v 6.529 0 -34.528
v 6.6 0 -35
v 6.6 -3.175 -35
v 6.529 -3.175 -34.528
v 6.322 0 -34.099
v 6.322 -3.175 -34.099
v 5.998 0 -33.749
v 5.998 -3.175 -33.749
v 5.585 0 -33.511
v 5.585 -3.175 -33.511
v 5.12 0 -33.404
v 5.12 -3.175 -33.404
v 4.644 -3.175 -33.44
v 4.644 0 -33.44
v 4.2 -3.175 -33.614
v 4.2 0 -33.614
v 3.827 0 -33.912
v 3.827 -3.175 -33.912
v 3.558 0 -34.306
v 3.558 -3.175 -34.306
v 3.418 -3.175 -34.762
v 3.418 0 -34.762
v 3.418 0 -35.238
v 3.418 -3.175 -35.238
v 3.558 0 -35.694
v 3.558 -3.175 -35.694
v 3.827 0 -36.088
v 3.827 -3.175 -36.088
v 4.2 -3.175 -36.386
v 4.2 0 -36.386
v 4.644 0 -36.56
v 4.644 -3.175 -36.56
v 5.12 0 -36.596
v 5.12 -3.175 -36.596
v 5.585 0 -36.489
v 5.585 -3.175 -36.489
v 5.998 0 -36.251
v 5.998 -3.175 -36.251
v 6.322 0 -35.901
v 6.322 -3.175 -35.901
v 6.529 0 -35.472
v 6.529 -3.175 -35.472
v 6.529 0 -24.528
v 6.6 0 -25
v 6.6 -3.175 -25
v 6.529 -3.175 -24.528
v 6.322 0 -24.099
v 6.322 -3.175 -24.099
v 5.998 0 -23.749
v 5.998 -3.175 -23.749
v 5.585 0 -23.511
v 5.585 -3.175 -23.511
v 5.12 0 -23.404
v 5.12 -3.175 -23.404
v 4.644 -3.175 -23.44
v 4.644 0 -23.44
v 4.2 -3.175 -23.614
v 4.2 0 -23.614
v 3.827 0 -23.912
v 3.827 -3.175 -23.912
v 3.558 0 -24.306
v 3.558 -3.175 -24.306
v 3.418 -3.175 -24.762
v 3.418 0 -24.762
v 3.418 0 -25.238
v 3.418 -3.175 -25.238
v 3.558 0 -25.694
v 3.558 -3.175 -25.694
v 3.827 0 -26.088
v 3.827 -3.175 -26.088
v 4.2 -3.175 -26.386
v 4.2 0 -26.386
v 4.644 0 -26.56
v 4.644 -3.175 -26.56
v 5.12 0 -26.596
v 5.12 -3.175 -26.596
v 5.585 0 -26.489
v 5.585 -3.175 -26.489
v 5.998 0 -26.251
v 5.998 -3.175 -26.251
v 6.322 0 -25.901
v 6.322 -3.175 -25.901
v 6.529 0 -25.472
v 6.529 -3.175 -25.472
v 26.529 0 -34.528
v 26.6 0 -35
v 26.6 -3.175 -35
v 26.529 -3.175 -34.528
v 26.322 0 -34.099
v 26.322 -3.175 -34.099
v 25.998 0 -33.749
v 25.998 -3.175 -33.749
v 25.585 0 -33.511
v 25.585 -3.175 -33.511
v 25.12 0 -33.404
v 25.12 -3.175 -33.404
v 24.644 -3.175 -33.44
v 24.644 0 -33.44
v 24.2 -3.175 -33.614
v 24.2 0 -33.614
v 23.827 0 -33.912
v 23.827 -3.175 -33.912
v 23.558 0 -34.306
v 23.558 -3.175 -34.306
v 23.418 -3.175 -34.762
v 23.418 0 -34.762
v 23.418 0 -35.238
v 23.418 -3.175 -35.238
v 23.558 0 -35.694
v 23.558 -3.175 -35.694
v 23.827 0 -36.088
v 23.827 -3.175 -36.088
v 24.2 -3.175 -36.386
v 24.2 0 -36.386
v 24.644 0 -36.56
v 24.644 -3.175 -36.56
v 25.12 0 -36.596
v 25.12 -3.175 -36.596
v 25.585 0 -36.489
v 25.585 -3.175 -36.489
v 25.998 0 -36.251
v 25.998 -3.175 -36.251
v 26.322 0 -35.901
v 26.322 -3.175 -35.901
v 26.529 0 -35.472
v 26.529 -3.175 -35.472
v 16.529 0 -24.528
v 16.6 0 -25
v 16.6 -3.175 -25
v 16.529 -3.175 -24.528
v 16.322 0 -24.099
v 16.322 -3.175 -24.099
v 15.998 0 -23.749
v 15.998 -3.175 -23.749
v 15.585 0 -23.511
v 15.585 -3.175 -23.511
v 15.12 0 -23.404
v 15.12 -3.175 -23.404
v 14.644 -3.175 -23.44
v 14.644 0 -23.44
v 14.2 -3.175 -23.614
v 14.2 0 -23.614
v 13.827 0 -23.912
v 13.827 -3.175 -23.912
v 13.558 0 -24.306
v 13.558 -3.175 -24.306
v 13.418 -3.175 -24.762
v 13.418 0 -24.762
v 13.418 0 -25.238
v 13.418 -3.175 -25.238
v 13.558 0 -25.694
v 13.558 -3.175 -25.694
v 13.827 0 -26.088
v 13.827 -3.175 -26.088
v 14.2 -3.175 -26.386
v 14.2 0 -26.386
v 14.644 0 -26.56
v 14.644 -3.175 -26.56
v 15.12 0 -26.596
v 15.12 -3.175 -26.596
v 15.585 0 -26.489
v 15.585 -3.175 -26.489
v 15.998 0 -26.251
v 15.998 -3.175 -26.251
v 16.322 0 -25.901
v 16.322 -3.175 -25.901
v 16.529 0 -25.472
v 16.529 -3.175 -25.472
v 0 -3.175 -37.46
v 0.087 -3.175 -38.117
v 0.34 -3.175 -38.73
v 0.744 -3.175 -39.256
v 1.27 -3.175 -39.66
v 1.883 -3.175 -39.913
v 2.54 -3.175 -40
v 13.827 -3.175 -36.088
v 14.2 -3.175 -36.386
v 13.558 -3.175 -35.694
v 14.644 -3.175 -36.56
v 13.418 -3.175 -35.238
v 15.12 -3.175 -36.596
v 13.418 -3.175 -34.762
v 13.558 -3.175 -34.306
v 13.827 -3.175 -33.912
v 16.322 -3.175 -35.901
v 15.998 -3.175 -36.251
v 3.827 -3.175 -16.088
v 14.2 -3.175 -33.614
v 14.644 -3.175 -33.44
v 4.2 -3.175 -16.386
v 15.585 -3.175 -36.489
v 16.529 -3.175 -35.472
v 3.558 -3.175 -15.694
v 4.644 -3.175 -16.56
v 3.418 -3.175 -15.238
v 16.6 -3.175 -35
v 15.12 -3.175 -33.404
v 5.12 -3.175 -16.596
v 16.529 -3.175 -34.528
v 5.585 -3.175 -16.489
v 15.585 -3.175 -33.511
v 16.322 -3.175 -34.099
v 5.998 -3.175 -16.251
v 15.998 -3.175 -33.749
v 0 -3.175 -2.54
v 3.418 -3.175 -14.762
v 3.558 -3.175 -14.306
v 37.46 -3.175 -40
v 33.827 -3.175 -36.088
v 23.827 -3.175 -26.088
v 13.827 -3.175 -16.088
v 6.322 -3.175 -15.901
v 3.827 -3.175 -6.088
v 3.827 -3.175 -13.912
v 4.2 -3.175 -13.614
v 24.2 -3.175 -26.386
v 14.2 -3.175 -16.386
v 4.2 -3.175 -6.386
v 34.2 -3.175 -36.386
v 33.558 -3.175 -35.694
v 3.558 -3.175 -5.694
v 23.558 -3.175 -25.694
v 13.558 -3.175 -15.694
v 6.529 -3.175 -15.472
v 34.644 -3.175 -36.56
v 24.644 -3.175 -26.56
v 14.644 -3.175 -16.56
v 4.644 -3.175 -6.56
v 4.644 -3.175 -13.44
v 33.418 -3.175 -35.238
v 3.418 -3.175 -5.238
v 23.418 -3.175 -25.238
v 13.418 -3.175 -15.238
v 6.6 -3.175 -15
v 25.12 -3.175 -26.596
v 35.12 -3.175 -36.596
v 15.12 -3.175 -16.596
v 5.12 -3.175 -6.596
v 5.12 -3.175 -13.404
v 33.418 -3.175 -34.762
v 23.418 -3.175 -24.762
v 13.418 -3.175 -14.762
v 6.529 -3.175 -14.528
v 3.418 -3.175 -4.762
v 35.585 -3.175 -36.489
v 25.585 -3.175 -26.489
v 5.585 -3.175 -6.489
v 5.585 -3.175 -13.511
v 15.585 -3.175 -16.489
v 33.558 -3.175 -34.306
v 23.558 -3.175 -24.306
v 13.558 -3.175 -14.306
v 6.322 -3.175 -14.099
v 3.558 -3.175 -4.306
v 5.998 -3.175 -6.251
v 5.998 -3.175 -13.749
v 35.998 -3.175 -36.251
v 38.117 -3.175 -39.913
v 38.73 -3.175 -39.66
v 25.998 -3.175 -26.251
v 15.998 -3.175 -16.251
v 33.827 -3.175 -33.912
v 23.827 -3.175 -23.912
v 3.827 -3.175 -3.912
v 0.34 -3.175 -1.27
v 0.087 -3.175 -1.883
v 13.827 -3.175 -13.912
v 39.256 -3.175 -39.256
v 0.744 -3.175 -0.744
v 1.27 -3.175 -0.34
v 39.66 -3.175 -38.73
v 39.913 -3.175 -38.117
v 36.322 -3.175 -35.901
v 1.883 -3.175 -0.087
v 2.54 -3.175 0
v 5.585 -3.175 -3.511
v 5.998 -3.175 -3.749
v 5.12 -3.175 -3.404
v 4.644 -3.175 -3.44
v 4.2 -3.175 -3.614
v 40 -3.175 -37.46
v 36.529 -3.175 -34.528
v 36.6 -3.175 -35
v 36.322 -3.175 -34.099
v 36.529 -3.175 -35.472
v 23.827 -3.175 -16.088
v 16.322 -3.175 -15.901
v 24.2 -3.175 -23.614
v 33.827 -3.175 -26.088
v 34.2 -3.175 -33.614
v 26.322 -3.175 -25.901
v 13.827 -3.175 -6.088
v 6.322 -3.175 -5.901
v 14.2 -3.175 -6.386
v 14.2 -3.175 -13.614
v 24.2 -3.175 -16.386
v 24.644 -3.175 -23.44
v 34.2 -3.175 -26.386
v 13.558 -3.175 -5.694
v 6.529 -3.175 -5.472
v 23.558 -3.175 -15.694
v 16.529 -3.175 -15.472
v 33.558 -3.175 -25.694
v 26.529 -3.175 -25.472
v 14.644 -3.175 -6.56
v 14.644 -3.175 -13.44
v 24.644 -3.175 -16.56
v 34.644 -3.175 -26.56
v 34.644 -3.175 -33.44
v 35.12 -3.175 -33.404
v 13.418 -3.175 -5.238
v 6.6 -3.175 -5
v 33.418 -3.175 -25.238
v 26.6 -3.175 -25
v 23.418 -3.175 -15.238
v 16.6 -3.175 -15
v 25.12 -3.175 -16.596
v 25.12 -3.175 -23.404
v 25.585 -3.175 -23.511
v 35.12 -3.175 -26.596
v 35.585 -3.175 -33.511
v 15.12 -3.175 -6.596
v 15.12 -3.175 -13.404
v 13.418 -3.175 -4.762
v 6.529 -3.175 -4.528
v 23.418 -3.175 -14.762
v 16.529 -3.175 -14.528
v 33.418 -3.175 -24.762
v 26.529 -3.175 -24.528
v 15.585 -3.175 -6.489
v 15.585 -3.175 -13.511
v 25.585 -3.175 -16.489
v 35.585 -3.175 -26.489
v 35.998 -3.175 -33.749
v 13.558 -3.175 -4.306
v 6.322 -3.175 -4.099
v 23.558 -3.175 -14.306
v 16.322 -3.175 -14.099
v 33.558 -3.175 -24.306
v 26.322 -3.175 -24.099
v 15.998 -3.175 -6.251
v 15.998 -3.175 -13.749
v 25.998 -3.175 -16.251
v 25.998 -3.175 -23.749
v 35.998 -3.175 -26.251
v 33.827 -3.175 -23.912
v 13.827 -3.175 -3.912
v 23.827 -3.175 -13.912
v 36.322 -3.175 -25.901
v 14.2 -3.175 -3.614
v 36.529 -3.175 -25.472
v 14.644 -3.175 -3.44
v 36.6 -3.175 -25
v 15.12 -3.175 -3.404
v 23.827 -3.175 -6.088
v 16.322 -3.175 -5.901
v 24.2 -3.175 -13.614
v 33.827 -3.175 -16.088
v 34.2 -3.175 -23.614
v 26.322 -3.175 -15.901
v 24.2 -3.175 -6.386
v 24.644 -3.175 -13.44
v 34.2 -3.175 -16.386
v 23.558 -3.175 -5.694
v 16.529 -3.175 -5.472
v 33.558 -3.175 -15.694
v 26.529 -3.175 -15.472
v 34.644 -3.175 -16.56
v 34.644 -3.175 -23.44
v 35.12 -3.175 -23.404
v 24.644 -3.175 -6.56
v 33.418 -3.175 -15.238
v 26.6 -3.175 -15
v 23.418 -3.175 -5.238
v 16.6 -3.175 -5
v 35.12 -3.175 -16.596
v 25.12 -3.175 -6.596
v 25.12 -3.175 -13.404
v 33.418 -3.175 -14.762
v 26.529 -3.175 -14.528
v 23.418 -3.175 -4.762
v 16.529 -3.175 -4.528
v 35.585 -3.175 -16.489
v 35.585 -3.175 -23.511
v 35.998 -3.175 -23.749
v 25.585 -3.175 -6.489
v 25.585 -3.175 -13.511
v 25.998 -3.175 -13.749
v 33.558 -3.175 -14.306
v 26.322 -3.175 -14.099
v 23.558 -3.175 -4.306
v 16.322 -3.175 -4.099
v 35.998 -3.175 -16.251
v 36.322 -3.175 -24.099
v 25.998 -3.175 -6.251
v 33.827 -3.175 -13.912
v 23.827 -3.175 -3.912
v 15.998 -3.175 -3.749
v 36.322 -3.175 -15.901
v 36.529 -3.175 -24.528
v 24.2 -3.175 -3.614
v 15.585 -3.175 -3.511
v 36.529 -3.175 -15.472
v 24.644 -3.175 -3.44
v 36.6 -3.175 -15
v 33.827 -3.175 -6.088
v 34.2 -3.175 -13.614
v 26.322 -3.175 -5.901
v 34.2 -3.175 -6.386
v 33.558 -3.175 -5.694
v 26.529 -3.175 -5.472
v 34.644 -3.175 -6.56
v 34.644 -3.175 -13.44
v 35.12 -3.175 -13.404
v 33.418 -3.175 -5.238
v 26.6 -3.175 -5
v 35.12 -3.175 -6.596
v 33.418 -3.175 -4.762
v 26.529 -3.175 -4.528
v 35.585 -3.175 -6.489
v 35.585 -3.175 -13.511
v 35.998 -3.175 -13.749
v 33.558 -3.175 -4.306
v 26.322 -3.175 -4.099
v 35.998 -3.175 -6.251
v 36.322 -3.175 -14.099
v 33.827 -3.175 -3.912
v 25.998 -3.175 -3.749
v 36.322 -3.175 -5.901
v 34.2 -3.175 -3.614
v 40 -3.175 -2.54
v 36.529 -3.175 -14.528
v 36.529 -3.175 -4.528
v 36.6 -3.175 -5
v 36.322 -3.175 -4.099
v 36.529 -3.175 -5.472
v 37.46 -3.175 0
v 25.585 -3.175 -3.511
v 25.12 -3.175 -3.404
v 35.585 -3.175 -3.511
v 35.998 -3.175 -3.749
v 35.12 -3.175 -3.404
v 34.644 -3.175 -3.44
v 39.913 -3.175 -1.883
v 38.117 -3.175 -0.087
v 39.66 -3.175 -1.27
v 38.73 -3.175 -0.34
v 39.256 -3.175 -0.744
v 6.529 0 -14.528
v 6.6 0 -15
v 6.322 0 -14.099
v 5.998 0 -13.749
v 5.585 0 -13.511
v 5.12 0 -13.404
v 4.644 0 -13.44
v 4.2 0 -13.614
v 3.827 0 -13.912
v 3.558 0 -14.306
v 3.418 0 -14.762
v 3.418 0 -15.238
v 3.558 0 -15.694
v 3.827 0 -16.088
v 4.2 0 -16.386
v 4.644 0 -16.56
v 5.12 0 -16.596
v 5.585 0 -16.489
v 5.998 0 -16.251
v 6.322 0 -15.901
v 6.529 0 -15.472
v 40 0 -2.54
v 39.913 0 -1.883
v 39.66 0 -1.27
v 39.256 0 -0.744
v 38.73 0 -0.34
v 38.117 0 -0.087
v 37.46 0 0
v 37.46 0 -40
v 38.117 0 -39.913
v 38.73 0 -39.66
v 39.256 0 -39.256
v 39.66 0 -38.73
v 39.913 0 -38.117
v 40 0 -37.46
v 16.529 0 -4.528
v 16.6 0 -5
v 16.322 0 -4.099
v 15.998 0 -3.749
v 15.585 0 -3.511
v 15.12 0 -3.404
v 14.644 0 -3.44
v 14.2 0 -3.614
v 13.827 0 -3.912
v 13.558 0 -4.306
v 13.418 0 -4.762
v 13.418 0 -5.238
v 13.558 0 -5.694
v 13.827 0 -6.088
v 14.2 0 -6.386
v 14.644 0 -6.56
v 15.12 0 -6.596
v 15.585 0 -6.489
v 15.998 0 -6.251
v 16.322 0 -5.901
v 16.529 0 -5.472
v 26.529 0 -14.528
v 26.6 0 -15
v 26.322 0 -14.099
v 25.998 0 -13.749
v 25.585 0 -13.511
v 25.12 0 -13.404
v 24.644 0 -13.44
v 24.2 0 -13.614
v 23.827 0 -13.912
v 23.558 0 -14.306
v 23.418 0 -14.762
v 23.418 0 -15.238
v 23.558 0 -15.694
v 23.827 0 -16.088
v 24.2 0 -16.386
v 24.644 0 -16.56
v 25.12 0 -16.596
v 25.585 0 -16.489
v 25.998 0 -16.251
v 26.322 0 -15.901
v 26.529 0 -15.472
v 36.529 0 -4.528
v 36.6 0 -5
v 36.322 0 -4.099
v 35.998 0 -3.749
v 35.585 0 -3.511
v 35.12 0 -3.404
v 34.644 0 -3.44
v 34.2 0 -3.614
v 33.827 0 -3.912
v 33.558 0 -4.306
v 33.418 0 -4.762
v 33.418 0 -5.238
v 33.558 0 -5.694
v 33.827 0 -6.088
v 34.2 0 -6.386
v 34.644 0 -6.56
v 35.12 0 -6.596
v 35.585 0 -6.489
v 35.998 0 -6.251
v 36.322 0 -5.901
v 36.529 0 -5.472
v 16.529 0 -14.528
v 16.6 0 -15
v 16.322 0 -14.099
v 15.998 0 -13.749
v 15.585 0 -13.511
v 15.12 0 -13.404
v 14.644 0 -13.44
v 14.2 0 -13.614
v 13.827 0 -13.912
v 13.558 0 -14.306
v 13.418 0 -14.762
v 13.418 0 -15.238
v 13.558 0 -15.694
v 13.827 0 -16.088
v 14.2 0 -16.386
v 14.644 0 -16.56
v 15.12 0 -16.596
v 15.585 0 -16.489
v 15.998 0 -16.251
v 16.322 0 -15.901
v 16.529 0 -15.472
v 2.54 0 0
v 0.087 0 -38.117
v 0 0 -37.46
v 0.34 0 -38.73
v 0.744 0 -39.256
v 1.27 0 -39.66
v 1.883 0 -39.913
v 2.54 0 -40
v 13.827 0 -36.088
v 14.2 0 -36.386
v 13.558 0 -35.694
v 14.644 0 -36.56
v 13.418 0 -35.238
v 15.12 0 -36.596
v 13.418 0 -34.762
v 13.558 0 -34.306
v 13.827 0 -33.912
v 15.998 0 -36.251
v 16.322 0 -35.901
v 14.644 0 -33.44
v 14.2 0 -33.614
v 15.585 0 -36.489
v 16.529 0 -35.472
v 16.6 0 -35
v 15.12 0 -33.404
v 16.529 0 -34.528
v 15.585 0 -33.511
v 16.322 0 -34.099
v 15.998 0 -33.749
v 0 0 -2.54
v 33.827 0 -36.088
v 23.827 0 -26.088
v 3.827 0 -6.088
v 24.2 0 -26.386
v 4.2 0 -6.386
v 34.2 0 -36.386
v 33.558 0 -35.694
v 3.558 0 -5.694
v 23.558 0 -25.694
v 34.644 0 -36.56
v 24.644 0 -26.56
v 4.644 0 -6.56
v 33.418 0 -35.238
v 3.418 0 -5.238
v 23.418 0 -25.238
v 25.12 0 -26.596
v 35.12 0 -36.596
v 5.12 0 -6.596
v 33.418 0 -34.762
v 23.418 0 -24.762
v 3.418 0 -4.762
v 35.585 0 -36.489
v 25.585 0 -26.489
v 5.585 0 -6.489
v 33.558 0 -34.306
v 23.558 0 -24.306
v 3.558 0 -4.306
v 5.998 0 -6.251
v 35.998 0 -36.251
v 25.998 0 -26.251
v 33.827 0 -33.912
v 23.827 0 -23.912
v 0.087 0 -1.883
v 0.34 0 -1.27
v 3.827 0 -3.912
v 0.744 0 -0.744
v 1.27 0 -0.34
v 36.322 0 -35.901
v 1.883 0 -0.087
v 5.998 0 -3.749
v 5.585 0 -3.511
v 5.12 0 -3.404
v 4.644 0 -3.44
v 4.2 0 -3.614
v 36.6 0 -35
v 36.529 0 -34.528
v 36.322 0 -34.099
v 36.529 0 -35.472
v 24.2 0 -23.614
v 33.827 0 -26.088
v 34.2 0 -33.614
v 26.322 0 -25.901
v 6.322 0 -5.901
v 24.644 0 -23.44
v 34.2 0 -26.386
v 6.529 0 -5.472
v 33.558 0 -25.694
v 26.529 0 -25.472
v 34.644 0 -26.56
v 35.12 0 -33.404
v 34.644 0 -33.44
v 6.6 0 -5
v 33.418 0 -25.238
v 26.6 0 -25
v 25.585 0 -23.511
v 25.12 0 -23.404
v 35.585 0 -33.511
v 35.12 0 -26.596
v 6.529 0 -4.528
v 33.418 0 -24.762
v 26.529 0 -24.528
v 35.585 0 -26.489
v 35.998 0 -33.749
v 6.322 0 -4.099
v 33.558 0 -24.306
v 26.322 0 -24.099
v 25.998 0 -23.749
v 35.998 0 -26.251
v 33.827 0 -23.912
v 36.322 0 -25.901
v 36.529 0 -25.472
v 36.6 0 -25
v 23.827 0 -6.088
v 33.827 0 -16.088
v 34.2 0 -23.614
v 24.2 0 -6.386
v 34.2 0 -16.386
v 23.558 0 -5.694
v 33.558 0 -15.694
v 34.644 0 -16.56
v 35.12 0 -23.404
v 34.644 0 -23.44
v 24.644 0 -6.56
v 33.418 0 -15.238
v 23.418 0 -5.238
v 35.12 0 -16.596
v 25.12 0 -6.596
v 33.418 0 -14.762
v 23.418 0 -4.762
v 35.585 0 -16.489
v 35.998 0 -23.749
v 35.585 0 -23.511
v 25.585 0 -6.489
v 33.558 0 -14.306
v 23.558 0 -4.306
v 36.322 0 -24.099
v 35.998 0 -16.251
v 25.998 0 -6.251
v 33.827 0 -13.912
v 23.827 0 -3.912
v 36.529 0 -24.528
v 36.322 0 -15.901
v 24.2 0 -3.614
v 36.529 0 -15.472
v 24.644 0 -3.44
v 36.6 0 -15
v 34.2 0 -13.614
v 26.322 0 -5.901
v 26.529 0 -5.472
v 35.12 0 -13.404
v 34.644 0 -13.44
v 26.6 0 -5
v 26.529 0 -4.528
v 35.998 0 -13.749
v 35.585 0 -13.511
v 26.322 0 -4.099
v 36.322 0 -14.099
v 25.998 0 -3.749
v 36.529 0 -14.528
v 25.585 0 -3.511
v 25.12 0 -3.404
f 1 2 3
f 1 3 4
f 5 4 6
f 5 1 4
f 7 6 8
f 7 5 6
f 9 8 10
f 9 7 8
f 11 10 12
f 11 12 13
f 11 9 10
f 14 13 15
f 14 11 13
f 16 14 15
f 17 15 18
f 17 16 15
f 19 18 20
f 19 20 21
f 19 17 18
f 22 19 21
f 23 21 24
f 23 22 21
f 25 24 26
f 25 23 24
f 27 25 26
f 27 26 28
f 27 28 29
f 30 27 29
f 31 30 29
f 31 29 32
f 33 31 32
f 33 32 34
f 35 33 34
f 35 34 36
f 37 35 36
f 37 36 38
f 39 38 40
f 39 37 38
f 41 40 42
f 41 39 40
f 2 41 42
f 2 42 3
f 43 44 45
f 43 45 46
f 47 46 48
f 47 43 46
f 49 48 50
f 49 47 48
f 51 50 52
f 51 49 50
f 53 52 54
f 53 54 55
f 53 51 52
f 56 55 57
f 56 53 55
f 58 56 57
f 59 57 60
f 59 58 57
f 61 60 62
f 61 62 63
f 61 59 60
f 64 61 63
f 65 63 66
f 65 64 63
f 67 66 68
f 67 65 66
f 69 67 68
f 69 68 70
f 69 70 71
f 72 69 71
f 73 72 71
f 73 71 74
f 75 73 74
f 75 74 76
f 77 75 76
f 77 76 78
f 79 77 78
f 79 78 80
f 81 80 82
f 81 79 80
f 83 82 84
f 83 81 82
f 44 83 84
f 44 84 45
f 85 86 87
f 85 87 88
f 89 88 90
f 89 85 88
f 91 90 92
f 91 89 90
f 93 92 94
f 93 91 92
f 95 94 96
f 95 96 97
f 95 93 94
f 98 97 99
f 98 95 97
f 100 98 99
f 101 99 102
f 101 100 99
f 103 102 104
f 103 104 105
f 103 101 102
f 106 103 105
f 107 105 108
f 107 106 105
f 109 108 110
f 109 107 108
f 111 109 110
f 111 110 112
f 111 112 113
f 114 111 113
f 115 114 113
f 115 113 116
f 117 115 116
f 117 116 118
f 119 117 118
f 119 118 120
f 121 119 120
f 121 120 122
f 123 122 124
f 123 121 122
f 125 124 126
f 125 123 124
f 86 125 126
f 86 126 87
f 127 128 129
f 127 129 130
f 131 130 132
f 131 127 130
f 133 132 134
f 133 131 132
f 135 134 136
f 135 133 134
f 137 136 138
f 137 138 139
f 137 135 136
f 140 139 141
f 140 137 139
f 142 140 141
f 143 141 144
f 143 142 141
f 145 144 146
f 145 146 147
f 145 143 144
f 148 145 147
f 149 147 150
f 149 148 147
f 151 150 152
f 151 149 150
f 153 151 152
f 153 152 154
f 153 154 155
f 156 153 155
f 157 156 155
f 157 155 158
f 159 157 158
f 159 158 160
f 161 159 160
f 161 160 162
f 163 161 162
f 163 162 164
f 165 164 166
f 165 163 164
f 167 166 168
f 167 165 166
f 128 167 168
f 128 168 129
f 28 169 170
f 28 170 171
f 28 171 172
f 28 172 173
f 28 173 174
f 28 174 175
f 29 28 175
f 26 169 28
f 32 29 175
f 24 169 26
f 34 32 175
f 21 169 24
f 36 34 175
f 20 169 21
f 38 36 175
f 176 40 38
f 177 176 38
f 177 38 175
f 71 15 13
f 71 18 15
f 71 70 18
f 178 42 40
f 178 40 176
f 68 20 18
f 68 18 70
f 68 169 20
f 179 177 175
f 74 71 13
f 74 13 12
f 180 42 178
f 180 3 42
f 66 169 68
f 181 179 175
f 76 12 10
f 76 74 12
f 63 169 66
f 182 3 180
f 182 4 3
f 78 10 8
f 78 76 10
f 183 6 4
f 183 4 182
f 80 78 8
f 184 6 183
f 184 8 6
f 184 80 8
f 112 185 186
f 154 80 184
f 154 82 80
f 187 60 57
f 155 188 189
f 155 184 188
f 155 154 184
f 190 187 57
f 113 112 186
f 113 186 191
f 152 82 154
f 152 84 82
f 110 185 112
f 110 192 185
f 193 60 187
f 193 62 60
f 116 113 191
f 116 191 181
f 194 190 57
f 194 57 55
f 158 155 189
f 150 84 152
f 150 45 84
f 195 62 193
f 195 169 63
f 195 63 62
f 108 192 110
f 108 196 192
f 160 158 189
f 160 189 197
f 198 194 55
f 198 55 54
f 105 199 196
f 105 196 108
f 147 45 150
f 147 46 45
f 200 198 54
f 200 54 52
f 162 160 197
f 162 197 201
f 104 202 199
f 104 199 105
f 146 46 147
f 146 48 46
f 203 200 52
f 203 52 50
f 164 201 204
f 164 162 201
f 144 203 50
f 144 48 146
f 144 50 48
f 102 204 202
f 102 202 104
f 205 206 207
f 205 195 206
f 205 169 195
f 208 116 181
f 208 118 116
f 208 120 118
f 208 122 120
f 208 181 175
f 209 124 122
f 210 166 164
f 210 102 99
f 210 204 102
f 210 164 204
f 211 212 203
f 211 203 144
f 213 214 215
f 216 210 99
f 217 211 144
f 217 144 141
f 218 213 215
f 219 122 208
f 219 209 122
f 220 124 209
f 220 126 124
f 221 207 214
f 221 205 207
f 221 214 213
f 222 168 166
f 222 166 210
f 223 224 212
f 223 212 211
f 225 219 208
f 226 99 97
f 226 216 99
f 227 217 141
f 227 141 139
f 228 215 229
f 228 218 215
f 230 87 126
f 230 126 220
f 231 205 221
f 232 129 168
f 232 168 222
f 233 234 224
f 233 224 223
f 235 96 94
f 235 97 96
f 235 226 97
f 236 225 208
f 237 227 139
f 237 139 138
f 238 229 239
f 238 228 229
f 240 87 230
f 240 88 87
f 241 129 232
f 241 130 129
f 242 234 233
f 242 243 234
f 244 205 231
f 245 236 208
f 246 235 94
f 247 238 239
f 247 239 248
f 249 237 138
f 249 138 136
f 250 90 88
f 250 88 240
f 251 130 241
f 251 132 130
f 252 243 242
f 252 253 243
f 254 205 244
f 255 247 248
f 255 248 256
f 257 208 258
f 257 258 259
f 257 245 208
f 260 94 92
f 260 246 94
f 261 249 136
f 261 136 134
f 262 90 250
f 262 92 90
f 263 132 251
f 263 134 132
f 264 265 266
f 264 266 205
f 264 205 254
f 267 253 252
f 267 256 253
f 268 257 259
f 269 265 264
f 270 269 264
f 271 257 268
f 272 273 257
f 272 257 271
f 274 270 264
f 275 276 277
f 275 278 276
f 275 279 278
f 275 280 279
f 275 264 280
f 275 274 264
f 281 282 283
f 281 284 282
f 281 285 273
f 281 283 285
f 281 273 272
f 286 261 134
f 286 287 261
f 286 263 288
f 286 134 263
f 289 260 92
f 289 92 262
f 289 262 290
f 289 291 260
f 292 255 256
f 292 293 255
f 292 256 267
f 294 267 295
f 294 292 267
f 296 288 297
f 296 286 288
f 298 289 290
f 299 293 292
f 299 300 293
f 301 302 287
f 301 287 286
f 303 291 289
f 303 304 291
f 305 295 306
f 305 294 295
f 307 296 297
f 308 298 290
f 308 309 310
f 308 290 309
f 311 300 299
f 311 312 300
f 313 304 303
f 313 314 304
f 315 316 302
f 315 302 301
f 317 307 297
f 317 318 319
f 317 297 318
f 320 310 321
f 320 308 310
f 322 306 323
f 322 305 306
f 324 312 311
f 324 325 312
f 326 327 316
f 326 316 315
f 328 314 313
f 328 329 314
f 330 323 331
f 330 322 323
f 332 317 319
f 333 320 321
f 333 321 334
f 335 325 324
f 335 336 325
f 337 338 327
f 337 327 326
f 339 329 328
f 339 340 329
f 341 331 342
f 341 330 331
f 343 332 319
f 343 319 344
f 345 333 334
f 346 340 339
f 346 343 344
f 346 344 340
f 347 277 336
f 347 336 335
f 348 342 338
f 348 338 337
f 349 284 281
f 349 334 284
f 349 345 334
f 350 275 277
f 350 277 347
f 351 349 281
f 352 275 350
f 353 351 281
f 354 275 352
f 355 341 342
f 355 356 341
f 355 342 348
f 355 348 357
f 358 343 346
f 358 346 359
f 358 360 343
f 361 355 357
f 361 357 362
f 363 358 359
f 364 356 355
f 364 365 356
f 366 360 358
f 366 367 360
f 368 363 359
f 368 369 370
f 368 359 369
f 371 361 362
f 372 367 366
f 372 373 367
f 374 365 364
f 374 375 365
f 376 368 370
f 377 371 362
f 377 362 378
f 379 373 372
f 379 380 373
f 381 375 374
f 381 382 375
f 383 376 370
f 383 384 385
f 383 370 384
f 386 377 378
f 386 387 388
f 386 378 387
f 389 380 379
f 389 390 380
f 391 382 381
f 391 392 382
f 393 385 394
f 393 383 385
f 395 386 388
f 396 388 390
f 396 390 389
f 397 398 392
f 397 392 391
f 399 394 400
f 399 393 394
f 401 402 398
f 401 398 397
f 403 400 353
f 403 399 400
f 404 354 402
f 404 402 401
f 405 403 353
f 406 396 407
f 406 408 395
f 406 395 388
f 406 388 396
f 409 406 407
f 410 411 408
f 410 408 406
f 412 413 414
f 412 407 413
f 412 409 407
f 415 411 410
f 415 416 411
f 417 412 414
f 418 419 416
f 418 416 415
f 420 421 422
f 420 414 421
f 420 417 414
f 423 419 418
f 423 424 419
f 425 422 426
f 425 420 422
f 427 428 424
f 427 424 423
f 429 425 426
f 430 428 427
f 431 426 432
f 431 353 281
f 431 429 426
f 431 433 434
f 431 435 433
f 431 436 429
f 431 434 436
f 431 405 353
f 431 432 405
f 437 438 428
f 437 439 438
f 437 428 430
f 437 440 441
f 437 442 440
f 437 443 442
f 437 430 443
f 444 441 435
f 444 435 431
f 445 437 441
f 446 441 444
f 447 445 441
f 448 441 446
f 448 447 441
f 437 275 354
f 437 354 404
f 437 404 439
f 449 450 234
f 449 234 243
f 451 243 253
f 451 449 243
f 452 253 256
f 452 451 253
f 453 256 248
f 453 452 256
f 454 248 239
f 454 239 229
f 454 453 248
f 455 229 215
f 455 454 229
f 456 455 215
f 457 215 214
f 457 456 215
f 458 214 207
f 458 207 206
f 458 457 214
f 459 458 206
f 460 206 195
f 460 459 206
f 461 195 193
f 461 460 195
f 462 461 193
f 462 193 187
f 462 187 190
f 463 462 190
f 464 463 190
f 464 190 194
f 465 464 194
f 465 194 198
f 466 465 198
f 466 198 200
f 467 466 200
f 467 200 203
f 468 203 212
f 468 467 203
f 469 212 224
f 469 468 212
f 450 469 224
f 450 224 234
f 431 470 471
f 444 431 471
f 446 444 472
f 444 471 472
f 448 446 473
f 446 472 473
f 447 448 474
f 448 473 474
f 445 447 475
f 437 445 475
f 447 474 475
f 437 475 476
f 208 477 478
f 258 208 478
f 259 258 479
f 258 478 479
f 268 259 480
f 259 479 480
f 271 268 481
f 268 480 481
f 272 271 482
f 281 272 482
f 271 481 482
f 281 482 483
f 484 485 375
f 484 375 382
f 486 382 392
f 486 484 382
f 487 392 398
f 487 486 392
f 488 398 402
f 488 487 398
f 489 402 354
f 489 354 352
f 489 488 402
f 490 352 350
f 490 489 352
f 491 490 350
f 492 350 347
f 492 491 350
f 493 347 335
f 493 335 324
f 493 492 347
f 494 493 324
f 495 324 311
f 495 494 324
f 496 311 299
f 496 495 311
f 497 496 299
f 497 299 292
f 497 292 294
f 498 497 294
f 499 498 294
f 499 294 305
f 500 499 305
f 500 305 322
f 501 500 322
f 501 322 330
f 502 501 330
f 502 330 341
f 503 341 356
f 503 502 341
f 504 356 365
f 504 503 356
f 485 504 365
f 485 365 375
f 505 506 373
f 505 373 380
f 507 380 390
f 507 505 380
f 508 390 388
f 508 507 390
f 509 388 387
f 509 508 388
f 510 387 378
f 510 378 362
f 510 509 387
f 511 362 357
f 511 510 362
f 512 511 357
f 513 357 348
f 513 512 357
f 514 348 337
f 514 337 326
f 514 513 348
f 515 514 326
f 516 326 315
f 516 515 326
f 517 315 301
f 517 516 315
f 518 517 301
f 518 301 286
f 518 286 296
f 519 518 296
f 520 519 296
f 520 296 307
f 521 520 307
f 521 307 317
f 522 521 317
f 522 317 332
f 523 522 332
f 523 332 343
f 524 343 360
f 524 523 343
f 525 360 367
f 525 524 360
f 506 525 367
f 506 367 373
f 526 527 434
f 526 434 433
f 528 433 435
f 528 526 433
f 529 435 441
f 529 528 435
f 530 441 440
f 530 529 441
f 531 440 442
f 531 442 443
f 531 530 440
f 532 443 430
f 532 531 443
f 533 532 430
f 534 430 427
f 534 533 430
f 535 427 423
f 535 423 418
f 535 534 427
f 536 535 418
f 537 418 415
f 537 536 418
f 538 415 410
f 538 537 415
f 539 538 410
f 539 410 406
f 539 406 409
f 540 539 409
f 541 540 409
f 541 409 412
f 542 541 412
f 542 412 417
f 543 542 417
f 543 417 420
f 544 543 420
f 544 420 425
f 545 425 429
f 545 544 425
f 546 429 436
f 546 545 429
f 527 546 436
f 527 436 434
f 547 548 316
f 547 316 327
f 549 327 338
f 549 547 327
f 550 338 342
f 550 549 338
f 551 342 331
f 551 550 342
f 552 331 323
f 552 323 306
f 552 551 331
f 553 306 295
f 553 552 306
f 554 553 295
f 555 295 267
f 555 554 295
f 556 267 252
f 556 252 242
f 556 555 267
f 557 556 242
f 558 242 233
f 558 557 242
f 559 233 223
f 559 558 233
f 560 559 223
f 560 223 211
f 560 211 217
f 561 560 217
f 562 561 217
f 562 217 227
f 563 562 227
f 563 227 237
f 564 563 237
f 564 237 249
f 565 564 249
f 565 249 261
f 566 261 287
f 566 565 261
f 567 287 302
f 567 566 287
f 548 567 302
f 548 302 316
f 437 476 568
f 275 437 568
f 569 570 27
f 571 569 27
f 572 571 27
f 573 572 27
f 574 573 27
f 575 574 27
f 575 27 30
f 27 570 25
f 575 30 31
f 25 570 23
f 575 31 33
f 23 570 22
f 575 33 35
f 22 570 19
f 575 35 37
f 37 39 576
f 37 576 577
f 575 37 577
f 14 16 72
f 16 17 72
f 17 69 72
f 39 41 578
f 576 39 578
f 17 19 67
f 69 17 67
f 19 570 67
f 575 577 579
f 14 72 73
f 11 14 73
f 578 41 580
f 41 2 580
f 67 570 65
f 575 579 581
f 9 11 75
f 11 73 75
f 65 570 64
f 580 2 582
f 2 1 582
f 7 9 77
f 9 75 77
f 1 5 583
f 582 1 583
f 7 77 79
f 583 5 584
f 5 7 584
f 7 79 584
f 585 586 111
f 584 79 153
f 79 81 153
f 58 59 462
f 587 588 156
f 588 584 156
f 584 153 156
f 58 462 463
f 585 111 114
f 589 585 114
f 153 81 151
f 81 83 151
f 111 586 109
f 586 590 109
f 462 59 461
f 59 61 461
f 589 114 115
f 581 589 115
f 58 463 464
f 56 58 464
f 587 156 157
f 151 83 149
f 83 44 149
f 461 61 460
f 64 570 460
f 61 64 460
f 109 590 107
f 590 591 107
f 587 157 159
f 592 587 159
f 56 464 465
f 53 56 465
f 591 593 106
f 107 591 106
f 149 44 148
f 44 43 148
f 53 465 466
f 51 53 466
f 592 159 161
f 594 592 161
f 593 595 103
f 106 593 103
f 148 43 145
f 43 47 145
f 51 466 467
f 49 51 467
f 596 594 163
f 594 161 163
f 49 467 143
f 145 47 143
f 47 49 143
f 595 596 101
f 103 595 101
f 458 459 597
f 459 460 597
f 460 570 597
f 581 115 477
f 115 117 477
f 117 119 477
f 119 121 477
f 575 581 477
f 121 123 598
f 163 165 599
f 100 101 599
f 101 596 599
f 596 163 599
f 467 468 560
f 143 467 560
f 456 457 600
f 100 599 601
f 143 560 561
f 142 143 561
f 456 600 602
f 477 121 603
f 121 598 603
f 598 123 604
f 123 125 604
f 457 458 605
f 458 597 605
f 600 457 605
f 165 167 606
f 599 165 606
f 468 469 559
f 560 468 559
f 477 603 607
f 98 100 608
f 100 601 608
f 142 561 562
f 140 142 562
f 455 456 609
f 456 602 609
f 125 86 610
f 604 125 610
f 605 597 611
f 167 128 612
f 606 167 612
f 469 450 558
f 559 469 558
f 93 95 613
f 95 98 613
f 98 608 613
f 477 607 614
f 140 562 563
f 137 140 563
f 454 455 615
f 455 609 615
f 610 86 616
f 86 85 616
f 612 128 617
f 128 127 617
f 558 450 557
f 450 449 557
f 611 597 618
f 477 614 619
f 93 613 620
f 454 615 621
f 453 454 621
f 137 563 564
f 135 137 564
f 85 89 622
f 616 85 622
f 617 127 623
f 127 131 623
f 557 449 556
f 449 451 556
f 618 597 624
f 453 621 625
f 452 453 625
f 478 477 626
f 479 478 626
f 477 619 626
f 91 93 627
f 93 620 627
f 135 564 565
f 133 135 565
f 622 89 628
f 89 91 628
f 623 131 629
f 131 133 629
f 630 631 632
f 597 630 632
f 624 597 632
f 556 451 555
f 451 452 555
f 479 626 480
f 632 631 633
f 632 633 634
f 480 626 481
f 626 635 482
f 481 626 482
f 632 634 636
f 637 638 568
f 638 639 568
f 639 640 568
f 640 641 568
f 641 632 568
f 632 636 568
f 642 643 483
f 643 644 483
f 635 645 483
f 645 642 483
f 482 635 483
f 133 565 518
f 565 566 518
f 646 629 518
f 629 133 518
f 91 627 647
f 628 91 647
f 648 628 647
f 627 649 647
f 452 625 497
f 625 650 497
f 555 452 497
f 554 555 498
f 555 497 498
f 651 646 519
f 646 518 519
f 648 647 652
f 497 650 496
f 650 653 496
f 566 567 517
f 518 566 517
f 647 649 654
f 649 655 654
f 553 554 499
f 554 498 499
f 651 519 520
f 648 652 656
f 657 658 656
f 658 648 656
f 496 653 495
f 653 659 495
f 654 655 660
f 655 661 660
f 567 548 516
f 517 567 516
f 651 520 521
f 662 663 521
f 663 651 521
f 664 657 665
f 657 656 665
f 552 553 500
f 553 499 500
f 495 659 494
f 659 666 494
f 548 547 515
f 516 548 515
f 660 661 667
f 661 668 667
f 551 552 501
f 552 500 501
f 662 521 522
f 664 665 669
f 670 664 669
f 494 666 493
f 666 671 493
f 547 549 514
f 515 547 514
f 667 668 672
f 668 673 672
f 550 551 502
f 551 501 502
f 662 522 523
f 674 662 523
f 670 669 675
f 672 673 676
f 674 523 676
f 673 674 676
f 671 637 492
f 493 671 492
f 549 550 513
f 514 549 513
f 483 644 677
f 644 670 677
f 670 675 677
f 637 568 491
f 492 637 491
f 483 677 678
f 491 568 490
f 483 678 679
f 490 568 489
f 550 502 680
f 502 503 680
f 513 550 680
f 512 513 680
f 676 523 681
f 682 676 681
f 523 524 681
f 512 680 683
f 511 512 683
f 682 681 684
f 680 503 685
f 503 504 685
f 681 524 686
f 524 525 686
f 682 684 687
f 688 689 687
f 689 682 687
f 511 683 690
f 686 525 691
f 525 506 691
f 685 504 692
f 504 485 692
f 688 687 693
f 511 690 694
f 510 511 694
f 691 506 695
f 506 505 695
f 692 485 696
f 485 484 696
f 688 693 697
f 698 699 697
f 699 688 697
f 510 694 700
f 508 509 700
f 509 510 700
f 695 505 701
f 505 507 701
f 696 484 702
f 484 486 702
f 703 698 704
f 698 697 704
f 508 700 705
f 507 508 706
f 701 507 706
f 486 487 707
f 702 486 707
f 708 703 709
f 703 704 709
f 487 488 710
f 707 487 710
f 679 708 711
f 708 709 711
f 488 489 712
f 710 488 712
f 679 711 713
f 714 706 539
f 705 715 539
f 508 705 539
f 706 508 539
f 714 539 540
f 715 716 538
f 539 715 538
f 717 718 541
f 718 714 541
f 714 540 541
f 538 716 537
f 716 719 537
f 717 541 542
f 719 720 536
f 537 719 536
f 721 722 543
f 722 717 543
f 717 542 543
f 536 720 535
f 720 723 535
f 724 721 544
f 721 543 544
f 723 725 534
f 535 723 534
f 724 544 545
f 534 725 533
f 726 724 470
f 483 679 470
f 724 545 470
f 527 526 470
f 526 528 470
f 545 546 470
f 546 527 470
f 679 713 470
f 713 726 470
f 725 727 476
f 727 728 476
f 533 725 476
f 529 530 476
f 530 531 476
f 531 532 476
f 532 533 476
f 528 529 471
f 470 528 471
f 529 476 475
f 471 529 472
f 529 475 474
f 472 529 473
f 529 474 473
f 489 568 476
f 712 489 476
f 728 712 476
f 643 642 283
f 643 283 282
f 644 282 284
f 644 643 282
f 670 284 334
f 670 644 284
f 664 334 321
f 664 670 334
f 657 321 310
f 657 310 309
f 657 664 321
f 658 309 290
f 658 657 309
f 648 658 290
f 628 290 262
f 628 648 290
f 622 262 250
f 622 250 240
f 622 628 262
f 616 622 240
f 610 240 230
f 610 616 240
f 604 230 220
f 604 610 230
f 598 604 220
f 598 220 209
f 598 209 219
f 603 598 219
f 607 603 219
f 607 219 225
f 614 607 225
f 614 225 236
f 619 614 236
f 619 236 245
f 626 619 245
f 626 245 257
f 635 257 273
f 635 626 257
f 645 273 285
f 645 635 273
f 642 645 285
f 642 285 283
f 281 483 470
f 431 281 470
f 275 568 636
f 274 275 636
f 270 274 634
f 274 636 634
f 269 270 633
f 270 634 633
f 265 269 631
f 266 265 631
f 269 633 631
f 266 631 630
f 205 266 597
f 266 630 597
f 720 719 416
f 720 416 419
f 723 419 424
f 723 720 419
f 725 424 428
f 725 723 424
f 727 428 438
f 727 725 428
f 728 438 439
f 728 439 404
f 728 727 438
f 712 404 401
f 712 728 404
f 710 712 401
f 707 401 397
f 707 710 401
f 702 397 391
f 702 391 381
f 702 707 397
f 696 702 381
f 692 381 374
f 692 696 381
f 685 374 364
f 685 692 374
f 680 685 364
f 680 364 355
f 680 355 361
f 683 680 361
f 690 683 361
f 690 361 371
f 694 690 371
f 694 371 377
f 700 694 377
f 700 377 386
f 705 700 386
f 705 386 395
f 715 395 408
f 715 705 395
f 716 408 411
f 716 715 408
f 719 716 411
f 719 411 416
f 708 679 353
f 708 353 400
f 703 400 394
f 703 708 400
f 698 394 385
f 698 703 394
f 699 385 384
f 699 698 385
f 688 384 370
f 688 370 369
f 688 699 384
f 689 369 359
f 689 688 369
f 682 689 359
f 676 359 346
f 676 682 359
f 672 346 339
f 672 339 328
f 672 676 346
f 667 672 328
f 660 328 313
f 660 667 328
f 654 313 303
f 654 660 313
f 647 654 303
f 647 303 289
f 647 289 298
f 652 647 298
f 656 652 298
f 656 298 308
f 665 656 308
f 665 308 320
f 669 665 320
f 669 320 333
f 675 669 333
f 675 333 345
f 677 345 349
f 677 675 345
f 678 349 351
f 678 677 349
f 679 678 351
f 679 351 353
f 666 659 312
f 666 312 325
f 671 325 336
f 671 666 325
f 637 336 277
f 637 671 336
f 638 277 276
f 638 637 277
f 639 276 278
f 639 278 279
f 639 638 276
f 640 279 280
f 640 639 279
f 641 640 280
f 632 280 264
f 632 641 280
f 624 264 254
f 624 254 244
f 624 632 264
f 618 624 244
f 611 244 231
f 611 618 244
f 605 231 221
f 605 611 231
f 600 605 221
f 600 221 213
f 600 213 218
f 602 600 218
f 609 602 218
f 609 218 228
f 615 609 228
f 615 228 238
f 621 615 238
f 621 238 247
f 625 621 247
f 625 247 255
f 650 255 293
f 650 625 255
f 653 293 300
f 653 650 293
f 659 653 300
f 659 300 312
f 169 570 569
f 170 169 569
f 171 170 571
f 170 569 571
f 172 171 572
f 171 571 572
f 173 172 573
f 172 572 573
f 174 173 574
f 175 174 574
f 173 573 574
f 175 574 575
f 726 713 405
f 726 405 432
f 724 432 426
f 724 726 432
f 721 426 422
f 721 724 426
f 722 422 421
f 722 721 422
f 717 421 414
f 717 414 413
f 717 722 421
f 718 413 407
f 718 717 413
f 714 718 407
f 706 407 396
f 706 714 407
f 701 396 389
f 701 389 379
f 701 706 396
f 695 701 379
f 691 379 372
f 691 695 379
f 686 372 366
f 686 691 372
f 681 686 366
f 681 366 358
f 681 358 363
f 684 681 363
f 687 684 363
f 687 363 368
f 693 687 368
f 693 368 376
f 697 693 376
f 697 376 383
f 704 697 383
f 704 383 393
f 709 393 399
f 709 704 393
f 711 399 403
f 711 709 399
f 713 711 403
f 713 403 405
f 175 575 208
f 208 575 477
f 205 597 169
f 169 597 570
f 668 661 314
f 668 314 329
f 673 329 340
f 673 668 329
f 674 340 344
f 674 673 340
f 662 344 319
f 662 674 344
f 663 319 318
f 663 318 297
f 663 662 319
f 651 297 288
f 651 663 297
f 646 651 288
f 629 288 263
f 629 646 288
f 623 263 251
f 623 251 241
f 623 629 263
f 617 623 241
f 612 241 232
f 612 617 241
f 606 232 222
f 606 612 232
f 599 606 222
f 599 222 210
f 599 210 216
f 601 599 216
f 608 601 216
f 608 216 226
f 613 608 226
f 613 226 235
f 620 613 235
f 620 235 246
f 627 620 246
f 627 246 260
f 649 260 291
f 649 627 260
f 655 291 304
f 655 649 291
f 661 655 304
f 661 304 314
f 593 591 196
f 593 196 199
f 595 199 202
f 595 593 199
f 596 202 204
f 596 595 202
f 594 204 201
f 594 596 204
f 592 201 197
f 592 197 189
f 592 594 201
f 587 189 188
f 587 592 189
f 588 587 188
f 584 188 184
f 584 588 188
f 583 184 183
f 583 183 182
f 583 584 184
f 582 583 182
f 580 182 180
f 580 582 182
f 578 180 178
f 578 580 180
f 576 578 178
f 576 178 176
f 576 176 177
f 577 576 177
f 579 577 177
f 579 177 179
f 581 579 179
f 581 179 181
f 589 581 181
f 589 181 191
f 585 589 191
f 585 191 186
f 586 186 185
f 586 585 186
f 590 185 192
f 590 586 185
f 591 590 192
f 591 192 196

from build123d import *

# Parameters (mm, degrees)
F0_R     = 1.6
F1_DEPTH = 3.175


# Not quite as in the source:
# - a length typed as a fraction of an inch, garbled in the dataset ("3 / 203.2 mm" for 3/8 in), is restored


with BuildPart() as f1:
    # F0 (on Front) → F1 (new body)
    with BuildSketch(Plane.XZ):
        with BuildLine():
            Line((37.46, 0), (2.54, 0))
            ThreePointArc((2.54, 0), (0.7439487758, -0.7439487758), (0, -2.54))
            Line((0, -2.54), (0, -37.46))
            ThreePointArc((0, -37.46), (0.7439487758, -39.2560512242), (2.54, -40))
            Line((2.54, -40), (37.46, -40))
            ThreePointArc((37.46, -40), (39.2560512242, -39.2560512242), (40, -37.46))
            Line((40, -37.46), (40, -2.54))
            ThreePointArc((40, -2.54), (39.2560512242, -0.7439487758), (37.46, 0))
        make_face()
        with Locations((5, -35)):
            Circle(F0_R, mode=Mode.SUBTRACT)
        with Locations((15, -35)):
            Circle(F0_R, mode=Mode.SUBTRACT)
        with Locations((5, -25)):
            Circle(F0_R, mode=Mode.SUBTRACT)
        with Locations((15, -25)):
            Circle(F0_R, mode=Mode.SUBTRACT)
        with Locations((25, -35)):
            Circle(F0_R, mode=Mode.SUBTRACT)
        with Locations((35, -35)):
            Circle(F0_R, mode=Mode.SUBTRACT)
        with Locations((25, -25)):
            Circle(F0_R, mode=Mode.SUBTRACT)
        with Locations((35, -25)):
            Circle(F0_R, mode=Mode.SUBTRACT)
        with Locations((5, -15)):
            Circle(F0_R, mode=Mode.SUBTRACT)
        with Locations((15, -15)):
            Circle(F0_R, mode=Mode.SUBTRACT)
        with Locations((5, -5)):
            Circle(F0_R, mode=Mode.SUBTRACT)
        with Locations((15, -5)):
            Circle(F0_R, mode=Mode.SUBTRACT)
        with Locations((25, -15)):
            Circle(F0_R, mode=Mode.SUBTRACT)
        with Locations((35, -15)):
            Circle(F0_R, mode=Mode.SUBTRACT)
        with Locations((25, -5)):
            Circle(F0_R, mode=Mode.SUBTRACT)
        with Locations((35, -5)):
            Circle(F0_R, mode=Mode.SUBTRACT)
    extrude(amount=F1_DEPTH)


solid = f1.part
